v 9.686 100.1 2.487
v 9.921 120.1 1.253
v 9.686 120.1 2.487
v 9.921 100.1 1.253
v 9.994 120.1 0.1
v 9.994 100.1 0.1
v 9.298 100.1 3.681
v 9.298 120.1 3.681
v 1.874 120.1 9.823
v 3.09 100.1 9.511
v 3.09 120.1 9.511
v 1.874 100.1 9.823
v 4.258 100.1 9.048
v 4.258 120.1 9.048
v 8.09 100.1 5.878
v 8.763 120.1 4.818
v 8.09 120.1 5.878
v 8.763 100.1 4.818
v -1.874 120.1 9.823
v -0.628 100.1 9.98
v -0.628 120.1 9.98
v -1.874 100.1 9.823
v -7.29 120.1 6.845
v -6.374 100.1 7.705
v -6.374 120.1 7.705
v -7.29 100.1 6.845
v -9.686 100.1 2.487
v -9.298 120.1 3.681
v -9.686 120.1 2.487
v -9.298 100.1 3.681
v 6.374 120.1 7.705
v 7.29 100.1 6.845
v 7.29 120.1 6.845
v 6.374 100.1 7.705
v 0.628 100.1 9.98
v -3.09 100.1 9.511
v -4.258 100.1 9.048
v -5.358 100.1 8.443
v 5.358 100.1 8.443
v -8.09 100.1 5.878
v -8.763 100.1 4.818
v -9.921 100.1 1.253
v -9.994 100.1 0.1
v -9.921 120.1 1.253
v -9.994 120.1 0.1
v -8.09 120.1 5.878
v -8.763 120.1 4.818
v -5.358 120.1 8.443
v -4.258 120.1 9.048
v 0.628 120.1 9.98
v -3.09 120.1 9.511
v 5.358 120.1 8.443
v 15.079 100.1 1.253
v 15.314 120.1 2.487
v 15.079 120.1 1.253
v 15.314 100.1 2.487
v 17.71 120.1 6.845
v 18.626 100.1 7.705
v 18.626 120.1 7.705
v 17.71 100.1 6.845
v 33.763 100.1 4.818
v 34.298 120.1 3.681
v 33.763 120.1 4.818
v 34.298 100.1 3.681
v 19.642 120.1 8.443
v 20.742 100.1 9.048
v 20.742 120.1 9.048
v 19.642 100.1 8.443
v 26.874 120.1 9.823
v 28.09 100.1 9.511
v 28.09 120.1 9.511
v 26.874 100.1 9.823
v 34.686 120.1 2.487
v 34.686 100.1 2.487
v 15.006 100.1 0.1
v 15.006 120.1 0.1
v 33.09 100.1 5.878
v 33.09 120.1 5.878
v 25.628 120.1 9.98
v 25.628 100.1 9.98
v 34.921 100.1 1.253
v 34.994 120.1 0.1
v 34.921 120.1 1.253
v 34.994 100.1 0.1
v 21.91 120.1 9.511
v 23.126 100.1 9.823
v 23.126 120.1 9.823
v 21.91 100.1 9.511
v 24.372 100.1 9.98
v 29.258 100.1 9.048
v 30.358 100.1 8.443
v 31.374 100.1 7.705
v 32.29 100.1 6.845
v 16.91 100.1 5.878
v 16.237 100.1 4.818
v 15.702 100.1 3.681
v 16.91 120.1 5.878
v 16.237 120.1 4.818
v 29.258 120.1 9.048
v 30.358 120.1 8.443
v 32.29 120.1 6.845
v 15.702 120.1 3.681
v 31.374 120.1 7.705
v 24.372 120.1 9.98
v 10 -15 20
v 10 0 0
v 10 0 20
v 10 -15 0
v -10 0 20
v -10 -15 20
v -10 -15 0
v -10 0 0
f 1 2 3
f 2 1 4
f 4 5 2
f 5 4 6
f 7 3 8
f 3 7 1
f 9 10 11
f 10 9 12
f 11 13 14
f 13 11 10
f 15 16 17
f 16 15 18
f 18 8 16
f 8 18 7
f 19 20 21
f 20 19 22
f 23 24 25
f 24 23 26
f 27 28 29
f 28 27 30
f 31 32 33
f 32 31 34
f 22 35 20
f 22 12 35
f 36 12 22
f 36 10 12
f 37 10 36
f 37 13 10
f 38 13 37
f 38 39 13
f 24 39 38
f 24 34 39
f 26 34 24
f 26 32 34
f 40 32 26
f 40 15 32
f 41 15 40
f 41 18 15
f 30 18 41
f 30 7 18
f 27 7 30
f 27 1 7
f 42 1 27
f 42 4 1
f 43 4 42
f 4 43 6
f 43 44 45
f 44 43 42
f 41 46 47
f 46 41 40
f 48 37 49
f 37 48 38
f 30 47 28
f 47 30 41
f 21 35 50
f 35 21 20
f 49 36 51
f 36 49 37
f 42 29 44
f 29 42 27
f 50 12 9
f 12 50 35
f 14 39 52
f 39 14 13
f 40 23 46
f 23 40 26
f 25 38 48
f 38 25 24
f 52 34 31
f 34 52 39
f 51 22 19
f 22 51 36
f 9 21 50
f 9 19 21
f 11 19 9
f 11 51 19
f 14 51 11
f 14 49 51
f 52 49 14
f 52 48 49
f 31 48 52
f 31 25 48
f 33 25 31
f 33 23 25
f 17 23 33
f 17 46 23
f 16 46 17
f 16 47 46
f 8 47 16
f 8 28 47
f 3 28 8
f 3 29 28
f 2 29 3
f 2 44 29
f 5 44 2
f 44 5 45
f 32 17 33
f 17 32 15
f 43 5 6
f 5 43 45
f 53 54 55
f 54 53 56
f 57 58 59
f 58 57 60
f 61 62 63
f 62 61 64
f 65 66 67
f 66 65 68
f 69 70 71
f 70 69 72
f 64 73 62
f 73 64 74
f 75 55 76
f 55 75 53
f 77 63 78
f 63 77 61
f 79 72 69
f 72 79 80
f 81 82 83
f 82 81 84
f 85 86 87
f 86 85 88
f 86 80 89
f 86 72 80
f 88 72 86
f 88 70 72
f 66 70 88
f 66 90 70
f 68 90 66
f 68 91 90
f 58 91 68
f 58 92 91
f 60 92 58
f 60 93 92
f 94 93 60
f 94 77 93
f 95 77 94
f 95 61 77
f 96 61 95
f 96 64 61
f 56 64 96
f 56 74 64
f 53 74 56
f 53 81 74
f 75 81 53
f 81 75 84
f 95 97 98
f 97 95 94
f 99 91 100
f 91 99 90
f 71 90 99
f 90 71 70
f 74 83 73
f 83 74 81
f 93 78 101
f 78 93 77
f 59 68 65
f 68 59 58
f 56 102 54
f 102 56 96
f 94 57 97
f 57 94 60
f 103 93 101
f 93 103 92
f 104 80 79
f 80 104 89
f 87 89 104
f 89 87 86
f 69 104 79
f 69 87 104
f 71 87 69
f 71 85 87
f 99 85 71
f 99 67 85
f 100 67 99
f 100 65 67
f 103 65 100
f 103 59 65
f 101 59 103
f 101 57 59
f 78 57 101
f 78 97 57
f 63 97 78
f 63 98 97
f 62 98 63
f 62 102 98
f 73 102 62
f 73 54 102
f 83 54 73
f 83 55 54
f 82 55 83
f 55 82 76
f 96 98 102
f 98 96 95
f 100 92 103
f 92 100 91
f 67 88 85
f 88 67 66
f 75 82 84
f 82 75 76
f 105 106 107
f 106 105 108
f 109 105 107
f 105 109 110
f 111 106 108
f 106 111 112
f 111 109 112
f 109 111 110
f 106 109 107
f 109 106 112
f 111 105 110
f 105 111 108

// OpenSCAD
shovel_length = 80; 
shovel_width  = 40; 
shovel_height = 20; 

cut_height = 2; 

thickness = 1;

$fn = 50; 

type="round";  // [round,cubic]
type="cubic";  // [round,cubic]

holes = 40; 
hole_width=1; 

    

module shovel_shape(type) {
   if (type=="cubic") {
            translate([-shovel_width/2,0,0]) {
                difference() {
                    cube([shovel_width, shovel_length, shovel_height]); 
                    translate([thickness,-1,thickness]) cube([shovel_width-2*thickness, shovel_length-thickness+1, shovel_height]); 
                }
            }
   }
   
   if (type == "round") {
    translate([0,0,shovel_height]) 
    difference() {
            rotate([-90,0,0]) 
                scale([shovel_width, shovel_height*2]) 
                    cylinder(shovel_length,d=1);
        
            translate([0,-1,thickness]) rotate([-90,0,0]) 
                scale([shovel_width-thickness, shovel_height*2]) 
                    cylinder(shovel_length-thickness+1,d=thickness);        
        
        translate([-shovel_width/2,-1,thickness]) cube([shovel_width+2, shovel_length+2, shovel_height]); 
    }
   }
}

module centercube(v) {
    translate([-v[0]/2,0,0]) cube(v);
}

module holes(type) {
        // start holes only when the material reached its thickness
    let(cutoffset       = shovel_length/shovel_height*thickness/2, 

        // how much y space there is for the holes, leave a margin of "tickness" at the start
        hole_space      = (shovel_length-cutoffset) - thickness,
    
        // reduce number of holes, if they wont fit, enforce at least 'thickness' space between them
        max_holes       = hole_space / (hole_width+thickness), 
        holecount       = min(holes, max_holes),
        // the offset of the holes
        hole_spacing    = hole_space / holecount,
    
        // how large the holes will be
        hole_span       = type=="cubic" ? shovel_width-4*thickness : 
                          type=="round" ? shovel_width-15*thickness : 0,
    
       // when we cut the cylinder, this is how large it is in x direction at the minimal point
       // circle equation => (x/w)² + (y/h)² = 1
       // w = shovel_with/2, h = shovel_height, y = shovel_height-cut_height
       min_width=  type=="round" ? shovel_width*sqrt(1- pow((shovel_height-cut_height)/shovel_height,2)) :
                   type=="cubic" ? shovel_width : 0
    
    ) {
    
    for (i = [1:holecount]) {
        // height / thickness = length / x -> x = length/height*thickness
        // color(i == 1 ? "red" : "blue")
        let(y = cutoffset + i * hole_spacing,
            round_width = (i-1)* (shovel_width*2-min_width)/hole_space+min_width,
            cutwidth = type == "round" ? round_width : 
                       type == "cubic" ? shovel_width-4*thickness : 0 
            )
            translate([0,y-hole_spacing,0]) 
                // centercube([cutwidth,hole_width,shovel_height]);
                rotate([90,0,0]) scale([cutwidth,cutwidth/shovel_width*shovel_height,1]) cylinder(hole_width,d=1);

    }
    

    }
}

handle_diameter = 20; 
handle_length = 20; 


module joint (tol = 0) {
     /*   let(h = handle_diameter/6,
            d = sqrt(2)*h,
            l = 3*d,
            w = 3*d) {
    
        difference() {
            translate([0,0,-h*3+h/2]) rotate([45,0,0]) rotate([0,-45,0]) {
                cube([h*2-tol,h*4-tol,h*2-tol]);
                translate([0,h*4,0]) cube([h*2-tol,h*3-tol,h*2-tol]);
            }
            translate([0,0,h*2+h/2]) centercube([handle_diameter/2+.2,handle_diameter,handle_diameter/2+.2]);    
            translate([0,0,h*2+h/2]) rotate([0,45,0]) centercube([handle_diameter/2*sqrt(2)+.2,50,handle_diameter/2+.2]);    
            mirror([1,0,0]) color("blue") translate([0,0,h*2+h/2-tol]) rotate([0,45,0]) centercube([handle_diameter/2*sqrt(2)+.2,50,handle_diameter/2+.2]); 

            translate([0,-d*2-.1,-handle_diameter/2]) centercube([handle_diameter+.1,2*d,handle_diameter+.1]);

       }
       
       } */
       
       let (h = handle_diameter/12, 
            d = h *sqrt(2)) {
            
            CubePoints = [
                  [  0   ,  0,  -5*h ],  // first square
                  [  4*h ,  0,  -h   ],  
                  [  0   ,  0,  3*h  ],  
                  [ -4*h ,  0,  -h   ],  

                  [  0   ,  5*h,    0 ],  // middle square
                  [  4*h ,  3*h,  2*h ],  
                  [  0   ,    h,  4*h ], 
                  [ -4*h ,  3*h,  2*h ], 
                                
                  [ 0, 9*h, 4*h]         // tip
 
            ];

  
            CubeFaces = [
                  //[0,1,2,3],  // bottom
                  [0,1,2], [0,2,3],
                  // [0,4,5,1], 
                  [0,4,5],[0,5,1],
                  
                  [4,8,5],
                  // [0,3,7,4],
                  [0,3,7], [0,7,4],
                  [4,7,8],
                  // [1,5,6,2],
                  [1,5,6],[1,6,2],
                  
                  // [3,7,6,2],  // bottom
                  [3,7,6],[3,6,2],
                  [5,6,8],
                  [7,6,8]
            ];
                
            polyhedron( CubePoints, CubeFaces );
       }           
}

module handle() {
    difference() {
        translate([0,.1,0]) rotate([-90,0,0]) cylinder(handle_length, d=handle_diameter); 
        color("red") joint();
    }
}

module shovel(type) {
    difference() {
        shovel_shape(type); 
        
   // tan(alpha) * shovel_length = shovel_height
        let (alpha=atan((shovel_height-cut_height)/(shovel_length-thickness)))
            translate([-shovel_width/2-1,-1,cut_height+thickness]) 
                rotate([alpha])
                    cube([shovel_width+2, shovel_length*2+2, shovel_height+1]);        
        
        holes(type);
    }
    
    // translate([-handle_diameter*2, shovel_length+20,0]) handle();
    
        

    
    
    

}

module handle_upper () {
    mirror([0,0,1]) 
    difference() {
        handle();
        translate([-.1,-.1,-.1])
        centercube([handle_diameter+.2,handle_length+.2,handle_diameter/2+.2]);
    }    
}

module handle_lower () {
    difference() {
        handle();
        translate([-.1,-.1,-.1-handle_diameter/2])
        centercube([handle_diameter+.2,handle_length+.2,handle_diameter/2+.2]);
    }
}

translate([0, shovel_length+20,0])  handle_upper();
translate([handle_diameter+5, shovel_length+20,0]) handle_lower();

translate([0,0,handle_diameter/2]) joint();
translate([0,-15,0]) centercube([20,15,20]);
// shovel("round"); 

// translate([0,0,max(50,shovel_height*2+5)]) shovel("cubic");
